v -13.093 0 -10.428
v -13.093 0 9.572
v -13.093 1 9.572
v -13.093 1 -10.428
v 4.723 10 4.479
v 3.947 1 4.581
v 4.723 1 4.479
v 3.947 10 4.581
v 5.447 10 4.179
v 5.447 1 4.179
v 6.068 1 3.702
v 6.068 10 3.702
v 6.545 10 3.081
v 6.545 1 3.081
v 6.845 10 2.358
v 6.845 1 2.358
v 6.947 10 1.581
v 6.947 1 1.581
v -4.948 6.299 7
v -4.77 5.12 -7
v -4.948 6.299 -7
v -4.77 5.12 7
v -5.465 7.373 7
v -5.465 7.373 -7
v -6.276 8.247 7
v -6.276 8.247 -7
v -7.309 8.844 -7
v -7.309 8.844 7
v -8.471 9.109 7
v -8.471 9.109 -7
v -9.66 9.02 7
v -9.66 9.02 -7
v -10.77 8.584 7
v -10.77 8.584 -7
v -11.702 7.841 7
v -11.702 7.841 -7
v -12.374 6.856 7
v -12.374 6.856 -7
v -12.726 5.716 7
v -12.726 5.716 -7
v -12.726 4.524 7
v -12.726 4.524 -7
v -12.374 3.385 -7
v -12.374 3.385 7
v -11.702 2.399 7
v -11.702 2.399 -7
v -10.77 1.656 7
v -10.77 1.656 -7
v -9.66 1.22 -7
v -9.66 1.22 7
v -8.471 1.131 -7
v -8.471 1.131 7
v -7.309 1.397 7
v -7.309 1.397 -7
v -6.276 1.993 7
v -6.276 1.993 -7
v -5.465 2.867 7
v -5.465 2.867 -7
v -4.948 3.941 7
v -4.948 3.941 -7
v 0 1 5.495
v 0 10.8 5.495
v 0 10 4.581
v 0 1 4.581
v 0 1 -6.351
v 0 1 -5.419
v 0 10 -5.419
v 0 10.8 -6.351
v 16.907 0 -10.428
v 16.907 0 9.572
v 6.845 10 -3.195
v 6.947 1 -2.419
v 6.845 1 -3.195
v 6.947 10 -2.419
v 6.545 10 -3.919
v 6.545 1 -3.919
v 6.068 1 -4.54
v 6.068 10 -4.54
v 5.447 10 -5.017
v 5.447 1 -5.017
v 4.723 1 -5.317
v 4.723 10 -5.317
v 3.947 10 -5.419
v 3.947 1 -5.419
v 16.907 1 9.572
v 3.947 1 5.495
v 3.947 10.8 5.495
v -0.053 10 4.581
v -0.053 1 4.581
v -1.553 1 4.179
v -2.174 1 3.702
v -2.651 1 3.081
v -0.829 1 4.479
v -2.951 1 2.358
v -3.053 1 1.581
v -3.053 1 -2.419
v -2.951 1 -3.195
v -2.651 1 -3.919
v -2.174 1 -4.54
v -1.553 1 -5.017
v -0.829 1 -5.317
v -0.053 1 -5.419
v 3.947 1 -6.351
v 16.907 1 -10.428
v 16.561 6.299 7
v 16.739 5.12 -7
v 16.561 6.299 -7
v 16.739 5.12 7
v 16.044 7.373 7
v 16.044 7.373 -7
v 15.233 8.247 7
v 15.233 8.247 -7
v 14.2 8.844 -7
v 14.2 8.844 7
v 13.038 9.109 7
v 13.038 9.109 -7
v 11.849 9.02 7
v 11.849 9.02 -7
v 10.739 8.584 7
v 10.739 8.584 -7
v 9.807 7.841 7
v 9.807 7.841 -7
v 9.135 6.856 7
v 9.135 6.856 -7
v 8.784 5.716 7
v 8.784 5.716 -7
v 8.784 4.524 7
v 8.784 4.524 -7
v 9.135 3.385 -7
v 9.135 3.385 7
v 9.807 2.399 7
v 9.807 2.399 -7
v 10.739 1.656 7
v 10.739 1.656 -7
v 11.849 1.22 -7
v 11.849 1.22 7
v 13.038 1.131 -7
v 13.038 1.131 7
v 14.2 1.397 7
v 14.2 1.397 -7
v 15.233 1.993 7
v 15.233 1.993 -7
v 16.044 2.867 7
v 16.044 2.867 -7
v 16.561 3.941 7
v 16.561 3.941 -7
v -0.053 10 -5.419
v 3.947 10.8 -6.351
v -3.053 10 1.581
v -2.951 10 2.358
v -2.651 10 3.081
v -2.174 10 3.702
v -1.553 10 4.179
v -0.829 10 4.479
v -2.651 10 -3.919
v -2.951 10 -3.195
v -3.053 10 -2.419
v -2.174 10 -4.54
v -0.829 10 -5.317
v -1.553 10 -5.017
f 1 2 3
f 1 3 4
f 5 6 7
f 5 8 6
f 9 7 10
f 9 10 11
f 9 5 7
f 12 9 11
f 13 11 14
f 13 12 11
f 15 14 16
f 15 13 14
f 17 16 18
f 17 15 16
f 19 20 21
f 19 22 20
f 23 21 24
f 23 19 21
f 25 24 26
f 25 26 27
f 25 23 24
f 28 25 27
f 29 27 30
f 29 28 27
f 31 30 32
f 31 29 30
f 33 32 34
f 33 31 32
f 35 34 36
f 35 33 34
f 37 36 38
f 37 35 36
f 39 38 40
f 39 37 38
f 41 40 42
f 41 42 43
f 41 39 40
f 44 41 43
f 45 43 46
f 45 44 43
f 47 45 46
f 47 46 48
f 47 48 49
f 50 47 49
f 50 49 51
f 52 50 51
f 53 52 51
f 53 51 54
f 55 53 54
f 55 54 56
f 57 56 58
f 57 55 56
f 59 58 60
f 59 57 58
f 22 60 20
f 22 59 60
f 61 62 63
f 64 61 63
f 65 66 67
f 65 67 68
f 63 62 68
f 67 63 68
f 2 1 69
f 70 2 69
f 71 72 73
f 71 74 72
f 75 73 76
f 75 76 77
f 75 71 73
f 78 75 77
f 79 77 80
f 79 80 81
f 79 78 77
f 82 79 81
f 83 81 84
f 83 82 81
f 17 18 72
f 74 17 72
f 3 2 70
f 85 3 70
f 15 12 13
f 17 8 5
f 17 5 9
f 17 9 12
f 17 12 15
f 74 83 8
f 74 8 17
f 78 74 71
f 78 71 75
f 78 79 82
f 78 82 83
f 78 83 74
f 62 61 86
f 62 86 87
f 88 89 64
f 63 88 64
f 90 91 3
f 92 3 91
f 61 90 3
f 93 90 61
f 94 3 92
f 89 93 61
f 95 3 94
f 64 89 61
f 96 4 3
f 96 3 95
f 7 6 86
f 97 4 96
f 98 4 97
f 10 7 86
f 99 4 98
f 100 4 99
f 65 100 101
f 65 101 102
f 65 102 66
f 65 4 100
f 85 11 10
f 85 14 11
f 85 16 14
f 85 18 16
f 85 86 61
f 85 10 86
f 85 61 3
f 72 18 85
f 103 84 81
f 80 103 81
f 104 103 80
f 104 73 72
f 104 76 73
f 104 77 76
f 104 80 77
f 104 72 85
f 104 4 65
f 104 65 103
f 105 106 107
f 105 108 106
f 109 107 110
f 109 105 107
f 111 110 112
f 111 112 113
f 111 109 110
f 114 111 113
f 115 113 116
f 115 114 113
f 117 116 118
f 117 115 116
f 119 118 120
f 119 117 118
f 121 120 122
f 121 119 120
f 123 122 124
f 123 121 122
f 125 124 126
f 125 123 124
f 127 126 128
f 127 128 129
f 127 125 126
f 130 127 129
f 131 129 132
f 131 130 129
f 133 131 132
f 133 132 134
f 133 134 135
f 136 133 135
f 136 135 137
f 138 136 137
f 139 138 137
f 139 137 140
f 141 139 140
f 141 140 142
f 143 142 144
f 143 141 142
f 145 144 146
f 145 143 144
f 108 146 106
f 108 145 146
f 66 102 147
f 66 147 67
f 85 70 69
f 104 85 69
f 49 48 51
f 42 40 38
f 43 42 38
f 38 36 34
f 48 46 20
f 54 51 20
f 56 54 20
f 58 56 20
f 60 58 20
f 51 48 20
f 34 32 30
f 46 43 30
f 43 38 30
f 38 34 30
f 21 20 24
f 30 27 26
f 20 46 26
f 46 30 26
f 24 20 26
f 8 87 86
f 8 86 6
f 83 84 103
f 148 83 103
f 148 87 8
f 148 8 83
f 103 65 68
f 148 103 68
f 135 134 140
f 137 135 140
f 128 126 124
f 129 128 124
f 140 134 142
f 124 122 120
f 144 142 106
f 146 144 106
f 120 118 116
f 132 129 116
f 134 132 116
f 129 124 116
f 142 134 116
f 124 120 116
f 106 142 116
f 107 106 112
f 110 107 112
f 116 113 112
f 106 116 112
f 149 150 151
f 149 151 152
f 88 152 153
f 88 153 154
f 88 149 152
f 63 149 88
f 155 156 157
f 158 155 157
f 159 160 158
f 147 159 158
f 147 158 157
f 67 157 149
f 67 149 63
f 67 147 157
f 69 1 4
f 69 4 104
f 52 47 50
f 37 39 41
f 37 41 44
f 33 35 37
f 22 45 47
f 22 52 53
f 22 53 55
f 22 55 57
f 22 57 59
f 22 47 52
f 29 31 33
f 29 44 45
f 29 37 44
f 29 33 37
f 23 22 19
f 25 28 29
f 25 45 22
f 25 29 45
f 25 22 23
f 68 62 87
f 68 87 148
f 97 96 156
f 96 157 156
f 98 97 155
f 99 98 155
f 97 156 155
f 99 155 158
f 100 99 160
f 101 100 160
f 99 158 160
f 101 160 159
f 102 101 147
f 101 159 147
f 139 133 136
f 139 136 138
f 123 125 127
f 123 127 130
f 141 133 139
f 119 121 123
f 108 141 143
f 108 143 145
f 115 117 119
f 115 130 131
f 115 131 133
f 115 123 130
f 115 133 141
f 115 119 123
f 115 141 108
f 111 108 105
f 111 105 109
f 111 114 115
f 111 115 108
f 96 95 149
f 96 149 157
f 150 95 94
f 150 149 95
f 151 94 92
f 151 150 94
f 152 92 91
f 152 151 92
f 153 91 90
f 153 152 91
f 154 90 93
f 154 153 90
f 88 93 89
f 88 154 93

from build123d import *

# Parameters (mm, degrees)
SKETCH1_W             = 30
SKETCH1_H             = 20
BOSS_EXTRUDE1_DEPTH   = 1
SKETCH3_R             = 4
BOSS_EXTRUDE2_DEPTH   = 7
BOSS_EXTRUDE2_2_DEPTH = 7
SKETCH4_W             = 10
SKETCH4_H             = 10
BOSS_EXTRUDE3_DEPTH   = 10
FILLET1_R             = 3
SKETCH5_W             = 11.846582311
SKETCH5_H             = 9.799674645
BOSS_EXTRUDE4_DEPTH   = 3.946978


with BuildPart() as part:
    # Sketch1 → Boss-Extrude1 (new body)
    with BuildSketch(Plane(origin=(0, 0, 0), x_dir=(1, 0, 0), z_dir=(0, 1, 0))):
        with Locations((1.907090465, 0.427872861)):
            Rectangle(SKETCH1_W, SKETCH1_H)
    extrude(amount=BOSS_EXTRUDE1_DEPTH)

    # Sketch4 → Boss-Extrude3 (add)
    with BuildSketch(Plane(origin=(0, 0, 0), x_dir=(1, 0, 0), z_dir=(0, 1, 0))):
        with Locations((1.946977958, 0.418889495)):
            Rectangle(SKETCH4_W, SKETCH4_H)
    extrude(amount=BOSS_EXTRUDE3_DEPTH)

    # Fillet1
    fillet1_edges = [part.edges().sort_by_distance(p)[0] for p in [
        (-3.053022042, 5.5, -5.418889495),
        (-3.053022042, 5.5, 4.581110505),
        (6.946977958, 5.5, 4.581110505),
        (6.946977958, 5.5, -5.418889495),
    ]]
    fillet(fillet1_edges, radius=FILLET1_R)

    # Sketch5 → Boss-Extrude4 (add)
    with BuildSketch(Plane(origin=(0, 0, 0), x_dir=(0, 0, -1), z_dir=(1, 0, 0))):
        with Locations((0.42787286, 5.899837323)):
            Rectangle(SKETCH5_W, SKETCH5_H)
    extrude(amount=BOSS_EXTRUDE4_DEPTH)


with BuildPart() as body_2:
    # Sketch3 → Boss-Extrude2 (new body, symmetric)
    with BuildSketch(Plane.XY):
        with Locations((-8.77028568, 5.120167101)):
            Circle(SKETCH3_R)
    extrude(amount=BOSS_EXTRUDE2_DEPTH, both=True)


with BuildPart() as body_3:
    # Sketch3 → Boss-Extrude2 2 (new body, symmetric)
    with BuildSketch(Plane.XY):
        with Locations((12.738987248, 5.120167101)):
            Circle(SKETCH3_R)
    extrude(amount=BOSS_EXTRUDE2_2_DEPTH, both=True)


solid = Compound([part.part, body_2.part, body_3.part])
